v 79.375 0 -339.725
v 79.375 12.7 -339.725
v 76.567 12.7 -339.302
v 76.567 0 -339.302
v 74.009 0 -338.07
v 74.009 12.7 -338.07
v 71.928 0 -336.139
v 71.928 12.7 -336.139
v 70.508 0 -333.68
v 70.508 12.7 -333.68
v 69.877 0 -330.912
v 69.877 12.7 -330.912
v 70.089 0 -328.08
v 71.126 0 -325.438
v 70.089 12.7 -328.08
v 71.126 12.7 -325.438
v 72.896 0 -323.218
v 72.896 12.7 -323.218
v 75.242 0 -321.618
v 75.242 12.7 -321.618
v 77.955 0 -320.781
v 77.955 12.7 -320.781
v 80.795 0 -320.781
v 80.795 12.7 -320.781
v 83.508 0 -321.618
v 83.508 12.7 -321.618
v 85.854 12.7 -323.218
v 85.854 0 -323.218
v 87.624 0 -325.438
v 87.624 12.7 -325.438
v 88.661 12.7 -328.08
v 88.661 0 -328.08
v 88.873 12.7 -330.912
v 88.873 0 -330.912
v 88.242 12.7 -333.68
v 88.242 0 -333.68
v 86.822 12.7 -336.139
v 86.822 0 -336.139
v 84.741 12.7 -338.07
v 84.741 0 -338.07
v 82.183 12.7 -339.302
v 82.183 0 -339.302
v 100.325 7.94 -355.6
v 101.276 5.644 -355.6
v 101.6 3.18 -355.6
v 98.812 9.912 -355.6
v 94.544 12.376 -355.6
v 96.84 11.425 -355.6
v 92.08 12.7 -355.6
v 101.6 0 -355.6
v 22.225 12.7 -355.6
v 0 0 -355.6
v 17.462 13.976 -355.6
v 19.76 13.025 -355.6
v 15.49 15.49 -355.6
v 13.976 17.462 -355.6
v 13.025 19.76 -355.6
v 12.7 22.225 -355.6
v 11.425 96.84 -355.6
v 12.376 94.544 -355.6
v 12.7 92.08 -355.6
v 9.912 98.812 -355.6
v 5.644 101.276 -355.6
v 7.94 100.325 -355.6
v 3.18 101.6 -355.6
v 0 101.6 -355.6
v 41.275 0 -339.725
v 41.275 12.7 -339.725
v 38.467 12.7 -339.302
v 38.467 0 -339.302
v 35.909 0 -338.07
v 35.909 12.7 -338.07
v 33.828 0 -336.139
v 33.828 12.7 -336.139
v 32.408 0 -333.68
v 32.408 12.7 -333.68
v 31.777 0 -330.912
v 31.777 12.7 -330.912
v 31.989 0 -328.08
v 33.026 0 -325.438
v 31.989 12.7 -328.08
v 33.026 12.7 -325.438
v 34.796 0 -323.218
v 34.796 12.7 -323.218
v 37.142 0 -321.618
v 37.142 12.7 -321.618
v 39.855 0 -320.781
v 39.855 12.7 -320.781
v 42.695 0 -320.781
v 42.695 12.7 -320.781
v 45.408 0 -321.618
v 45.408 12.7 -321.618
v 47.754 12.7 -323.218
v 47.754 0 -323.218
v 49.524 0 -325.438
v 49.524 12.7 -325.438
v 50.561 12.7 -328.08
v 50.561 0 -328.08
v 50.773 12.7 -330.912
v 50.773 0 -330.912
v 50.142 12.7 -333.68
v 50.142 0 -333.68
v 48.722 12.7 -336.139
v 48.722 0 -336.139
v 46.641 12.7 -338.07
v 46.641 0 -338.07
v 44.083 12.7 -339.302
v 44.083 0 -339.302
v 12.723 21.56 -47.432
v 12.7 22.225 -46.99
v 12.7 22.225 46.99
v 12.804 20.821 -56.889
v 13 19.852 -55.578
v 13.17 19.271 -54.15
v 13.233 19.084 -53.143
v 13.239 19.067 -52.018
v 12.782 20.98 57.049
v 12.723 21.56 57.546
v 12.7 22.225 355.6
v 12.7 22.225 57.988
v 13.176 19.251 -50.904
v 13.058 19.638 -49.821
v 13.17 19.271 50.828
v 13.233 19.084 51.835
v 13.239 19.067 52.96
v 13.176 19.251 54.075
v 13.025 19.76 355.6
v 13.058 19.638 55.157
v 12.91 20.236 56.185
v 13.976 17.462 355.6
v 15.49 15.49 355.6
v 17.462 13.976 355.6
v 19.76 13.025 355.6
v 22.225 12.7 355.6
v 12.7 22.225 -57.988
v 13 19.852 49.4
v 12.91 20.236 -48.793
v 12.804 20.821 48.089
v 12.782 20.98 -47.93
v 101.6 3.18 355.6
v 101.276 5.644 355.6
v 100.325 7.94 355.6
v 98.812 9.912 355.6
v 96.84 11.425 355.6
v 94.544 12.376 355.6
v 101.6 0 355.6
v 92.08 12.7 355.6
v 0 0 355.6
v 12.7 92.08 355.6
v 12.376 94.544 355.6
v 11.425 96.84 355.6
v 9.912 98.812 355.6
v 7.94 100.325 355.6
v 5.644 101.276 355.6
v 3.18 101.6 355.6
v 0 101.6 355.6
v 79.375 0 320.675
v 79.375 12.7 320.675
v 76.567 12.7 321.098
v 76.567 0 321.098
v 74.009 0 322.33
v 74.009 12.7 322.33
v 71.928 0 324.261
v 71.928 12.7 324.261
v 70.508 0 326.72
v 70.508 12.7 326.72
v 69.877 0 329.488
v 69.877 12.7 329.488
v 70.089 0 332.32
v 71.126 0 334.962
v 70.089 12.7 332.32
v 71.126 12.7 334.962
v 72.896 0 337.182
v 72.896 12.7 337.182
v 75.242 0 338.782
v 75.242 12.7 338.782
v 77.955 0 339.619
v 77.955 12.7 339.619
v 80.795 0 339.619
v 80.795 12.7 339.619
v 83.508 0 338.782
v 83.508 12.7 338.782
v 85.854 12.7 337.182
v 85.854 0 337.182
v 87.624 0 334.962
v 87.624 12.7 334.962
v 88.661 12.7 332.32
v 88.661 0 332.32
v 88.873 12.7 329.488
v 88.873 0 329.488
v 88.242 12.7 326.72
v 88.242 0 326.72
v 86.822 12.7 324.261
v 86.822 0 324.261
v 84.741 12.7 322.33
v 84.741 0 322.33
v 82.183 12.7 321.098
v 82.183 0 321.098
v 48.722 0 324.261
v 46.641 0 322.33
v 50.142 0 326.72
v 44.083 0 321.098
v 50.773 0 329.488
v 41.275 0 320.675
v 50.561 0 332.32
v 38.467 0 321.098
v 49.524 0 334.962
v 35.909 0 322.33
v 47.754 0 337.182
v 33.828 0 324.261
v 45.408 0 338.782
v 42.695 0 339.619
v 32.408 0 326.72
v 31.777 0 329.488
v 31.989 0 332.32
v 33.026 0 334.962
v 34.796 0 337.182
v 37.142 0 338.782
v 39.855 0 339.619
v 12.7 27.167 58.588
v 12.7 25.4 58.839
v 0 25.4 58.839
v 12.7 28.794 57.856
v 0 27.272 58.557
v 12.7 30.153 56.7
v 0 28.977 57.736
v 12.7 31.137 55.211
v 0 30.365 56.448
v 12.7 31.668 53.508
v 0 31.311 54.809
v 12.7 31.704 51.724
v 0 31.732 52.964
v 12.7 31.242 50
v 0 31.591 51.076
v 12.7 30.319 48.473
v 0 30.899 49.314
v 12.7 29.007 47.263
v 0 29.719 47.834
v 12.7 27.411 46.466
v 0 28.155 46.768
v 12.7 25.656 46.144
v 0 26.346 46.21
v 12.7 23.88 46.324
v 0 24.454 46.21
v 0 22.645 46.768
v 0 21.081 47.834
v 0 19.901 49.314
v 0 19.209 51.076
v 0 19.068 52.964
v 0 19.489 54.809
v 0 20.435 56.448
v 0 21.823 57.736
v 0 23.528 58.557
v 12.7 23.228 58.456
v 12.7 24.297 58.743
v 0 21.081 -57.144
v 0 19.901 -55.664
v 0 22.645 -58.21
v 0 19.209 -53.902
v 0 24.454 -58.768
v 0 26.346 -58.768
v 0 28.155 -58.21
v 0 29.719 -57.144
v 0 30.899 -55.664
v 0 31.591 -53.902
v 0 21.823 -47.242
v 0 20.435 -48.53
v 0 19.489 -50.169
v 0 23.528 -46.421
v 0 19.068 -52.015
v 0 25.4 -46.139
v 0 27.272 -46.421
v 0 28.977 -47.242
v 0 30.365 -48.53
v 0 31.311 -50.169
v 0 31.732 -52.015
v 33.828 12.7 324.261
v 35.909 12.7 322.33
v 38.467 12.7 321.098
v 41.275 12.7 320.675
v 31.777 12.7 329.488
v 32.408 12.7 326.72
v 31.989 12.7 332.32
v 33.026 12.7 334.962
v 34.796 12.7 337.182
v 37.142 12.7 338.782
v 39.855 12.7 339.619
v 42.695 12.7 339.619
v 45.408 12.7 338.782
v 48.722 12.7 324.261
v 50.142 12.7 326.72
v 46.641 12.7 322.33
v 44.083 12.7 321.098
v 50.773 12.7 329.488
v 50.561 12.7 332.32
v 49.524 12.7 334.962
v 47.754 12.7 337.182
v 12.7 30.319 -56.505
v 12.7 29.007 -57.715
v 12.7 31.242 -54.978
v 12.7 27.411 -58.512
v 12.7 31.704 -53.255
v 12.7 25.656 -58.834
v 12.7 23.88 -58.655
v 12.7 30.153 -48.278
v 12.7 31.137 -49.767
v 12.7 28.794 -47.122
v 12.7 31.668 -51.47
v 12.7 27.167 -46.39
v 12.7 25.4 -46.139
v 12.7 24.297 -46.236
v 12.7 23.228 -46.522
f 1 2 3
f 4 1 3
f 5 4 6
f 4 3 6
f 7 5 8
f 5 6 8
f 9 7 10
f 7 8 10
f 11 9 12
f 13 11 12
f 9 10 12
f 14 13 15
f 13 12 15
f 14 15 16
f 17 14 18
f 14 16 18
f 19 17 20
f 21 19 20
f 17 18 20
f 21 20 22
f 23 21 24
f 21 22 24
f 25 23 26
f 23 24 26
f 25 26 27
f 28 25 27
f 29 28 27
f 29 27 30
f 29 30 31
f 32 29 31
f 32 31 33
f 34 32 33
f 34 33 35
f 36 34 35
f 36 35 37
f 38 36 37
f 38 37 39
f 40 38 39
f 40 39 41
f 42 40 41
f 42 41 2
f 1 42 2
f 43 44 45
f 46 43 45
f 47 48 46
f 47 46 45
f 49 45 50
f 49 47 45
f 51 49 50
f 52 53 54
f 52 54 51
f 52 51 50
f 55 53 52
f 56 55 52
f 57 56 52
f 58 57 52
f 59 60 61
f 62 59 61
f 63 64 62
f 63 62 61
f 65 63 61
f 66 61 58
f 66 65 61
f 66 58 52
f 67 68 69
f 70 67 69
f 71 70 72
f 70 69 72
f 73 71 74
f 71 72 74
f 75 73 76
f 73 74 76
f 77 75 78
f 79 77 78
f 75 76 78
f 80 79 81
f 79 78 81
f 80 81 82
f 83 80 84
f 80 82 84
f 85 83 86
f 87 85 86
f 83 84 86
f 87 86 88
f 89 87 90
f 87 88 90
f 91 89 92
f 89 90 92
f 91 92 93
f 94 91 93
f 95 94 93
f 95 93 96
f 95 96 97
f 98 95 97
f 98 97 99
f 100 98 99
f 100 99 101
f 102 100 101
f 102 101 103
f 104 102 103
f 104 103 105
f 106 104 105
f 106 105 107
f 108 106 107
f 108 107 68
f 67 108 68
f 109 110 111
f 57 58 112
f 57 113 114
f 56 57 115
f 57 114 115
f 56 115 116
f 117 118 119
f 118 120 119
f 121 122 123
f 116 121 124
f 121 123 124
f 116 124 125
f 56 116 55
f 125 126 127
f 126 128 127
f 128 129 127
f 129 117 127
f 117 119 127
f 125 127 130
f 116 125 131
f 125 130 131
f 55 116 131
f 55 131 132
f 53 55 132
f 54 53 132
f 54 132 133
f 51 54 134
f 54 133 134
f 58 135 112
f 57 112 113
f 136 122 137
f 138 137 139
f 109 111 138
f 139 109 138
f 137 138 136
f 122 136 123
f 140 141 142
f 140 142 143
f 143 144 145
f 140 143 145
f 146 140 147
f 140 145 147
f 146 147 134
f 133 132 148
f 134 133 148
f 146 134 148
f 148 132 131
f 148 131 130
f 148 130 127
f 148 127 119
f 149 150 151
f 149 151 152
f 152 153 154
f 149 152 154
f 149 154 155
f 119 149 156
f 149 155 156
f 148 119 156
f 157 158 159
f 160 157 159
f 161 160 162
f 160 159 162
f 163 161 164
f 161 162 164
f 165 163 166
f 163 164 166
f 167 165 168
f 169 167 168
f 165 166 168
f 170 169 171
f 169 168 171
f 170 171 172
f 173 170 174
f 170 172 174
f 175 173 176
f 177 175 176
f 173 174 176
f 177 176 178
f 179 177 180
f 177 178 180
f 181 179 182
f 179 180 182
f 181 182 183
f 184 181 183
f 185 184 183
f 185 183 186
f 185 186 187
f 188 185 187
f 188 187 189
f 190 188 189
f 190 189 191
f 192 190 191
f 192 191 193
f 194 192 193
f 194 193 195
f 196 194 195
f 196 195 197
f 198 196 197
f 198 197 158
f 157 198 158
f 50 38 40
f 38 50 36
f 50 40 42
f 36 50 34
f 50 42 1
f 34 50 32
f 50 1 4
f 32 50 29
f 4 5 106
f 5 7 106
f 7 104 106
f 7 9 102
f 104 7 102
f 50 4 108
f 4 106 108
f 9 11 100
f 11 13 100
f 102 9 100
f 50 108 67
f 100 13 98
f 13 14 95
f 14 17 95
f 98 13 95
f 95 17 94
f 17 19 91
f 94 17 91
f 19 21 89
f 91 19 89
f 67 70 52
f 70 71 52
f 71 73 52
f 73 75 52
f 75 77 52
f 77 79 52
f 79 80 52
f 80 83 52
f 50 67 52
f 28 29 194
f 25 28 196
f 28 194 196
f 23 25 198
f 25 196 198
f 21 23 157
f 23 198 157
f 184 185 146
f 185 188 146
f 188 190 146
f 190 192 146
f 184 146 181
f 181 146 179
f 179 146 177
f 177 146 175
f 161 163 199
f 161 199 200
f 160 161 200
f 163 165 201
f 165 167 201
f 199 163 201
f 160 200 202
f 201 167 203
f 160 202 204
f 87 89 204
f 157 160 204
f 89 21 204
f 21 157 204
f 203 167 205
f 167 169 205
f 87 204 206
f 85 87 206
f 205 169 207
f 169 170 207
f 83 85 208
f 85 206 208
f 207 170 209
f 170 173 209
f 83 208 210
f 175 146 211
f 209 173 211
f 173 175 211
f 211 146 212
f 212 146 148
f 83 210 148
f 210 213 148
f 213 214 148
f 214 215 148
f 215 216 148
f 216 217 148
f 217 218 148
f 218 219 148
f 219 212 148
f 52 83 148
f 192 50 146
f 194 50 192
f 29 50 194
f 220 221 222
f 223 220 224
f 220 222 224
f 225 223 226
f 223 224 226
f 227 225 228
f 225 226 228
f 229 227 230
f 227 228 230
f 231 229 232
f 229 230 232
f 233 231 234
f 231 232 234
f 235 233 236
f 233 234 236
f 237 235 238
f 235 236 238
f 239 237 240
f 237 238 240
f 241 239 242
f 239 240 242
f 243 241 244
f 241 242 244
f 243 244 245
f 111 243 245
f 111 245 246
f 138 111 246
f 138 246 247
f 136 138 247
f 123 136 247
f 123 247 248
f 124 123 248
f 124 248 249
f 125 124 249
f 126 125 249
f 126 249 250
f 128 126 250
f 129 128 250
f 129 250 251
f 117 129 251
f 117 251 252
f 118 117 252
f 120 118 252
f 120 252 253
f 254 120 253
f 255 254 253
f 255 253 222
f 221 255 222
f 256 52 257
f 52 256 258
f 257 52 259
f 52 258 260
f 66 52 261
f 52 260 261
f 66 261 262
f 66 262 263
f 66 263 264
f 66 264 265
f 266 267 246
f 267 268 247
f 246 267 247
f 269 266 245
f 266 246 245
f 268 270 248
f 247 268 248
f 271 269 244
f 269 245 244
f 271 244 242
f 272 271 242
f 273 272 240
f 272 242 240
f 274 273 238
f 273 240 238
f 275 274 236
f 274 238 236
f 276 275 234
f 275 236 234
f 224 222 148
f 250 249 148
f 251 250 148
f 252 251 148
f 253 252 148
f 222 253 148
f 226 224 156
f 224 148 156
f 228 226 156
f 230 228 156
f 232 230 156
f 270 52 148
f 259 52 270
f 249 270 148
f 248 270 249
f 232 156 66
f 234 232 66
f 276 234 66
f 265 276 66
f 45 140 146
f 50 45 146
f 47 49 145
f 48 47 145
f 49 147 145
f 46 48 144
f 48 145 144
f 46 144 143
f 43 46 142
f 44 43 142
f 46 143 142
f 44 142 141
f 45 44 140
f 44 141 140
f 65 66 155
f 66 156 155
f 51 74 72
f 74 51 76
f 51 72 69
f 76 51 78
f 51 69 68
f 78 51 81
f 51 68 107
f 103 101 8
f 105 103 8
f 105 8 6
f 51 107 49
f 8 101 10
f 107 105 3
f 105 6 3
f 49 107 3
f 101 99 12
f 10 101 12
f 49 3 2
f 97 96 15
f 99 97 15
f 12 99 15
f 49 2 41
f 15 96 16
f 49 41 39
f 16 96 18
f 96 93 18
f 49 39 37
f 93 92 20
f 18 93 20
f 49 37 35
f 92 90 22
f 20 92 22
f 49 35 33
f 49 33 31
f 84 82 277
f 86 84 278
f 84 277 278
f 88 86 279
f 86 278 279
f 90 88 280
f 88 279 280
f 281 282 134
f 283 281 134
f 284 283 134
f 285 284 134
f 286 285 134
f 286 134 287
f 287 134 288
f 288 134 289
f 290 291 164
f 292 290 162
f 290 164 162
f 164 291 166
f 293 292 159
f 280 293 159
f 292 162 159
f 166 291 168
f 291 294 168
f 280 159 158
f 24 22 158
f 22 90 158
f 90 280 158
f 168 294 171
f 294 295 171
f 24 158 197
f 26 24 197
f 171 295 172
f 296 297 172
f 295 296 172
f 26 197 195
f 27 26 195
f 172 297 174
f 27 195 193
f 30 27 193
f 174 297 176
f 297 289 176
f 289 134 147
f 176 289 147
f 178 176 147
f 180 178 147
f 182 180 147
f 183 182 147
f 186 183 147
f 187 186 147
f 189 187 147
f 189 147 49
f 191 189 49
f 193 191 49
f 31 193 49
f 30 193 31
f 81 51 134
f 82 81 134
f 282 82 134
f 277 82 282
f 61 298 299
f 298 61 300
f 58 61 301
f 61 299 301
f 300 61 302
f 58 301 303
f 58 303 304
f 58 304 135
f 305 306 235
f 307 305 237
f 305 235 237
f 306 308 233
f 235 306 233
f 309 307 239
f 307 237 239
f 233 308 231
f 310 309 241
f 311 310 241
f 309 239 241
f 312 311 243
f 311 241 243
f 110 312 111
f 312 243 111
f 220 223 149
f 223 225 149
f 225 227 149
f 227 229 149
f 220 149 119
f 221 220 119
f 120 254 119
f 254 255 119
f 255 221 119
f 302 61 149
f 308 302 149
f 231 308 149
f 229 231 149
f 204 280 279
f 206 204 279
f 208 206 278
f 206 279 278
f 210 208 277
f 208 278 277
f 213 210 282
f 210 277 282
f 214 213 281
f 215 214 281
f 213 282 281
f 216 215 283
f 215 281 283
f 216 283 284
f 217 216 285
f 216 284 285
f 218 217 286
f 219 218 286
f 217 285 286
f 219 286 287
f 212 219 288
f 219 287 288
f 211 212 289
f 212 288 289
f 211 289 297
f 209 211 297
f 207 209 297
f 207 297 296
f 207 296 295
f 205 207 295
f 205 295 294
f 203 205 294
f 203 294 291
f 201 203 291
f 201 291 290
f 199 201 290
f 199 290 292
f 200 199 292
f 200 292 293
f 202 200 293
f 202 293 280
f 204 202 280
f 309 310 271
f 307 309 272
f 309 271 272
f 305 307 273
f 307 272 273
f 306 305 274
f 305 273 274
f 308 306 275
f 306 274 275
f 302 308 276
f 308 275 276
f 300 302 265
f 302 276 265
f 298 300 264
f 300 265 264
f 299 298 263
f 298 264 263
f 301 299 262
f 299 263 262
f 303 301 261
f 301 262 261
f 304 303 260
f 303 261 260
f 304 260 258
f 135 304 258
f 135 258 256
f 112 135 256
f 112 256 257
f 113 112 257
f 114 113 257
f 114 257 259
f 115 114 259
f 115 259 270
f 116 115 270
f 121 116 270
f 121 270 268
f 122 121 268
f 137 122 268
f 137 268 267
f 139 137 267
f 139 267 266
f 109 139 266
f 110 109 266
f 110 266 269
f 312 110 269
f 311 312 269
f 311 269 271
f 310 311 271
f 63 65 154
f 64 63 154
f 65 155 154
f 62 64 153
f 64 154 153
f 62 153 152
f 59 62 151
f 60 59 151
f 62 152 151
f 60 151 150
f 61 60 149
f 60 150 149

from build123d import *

# Parameters (mm, degrees)
BOSS_EXTRUDE1_DEPTH = 355.6
CUT_EXTRUDE1_REACH  = 14.7
SKETCH3_R           = 9.525
CUT_EXTRUDE2_REACH  = 103.6
SKETCH4_R           = 6.35


with BuildPart() as part:
    # Sketch1 → Boss-Extrude1 (new body, symmetric)
    with BuildSketch(Plane.XY):
        with BuildLine():
            Line((0, 0), (0, 101.6))
            Line((0, 101.6), (3.18008, 101.6))
            ThreePointArc((3.18008, 101.6), (9.911679988, 98.811679988), (12.7, 92.08008))
            Line((12.7, 92.08008), (12.7, 22.225))
            ThreePointArc((12.7, 22.225), (15.489807909, 15.489807909), (22.225, 12.7))
            Line((22.225, 12.7), (92.08008, 12.7))
            ThreePointArc((92.08008, 12.7), (98.811679988, 9.911679988), (101.6, 3.18008))
            Line((101.6, 3.18008), (101.6, 0))
            Line((101.6, 0), (0, 0))
        make_face()
    extrude(amount=BOSS_EXTRUDE1_DEPTH, both=True)

    # Sketch3 → Cut-Extrude1 (cut, up to next)
    with BuildSketch(Plane(origin=(25.4, 12.7, 0), x_dir=(0, 0, -1), z_dir=(0, 1, 0)), mode=Mode.PRIVATE) as cut_extrude1_sk1:
        with Locations((330.2, -15.875)):
            Circle(SKETCH3_R)
    cut_extrude1_tool1 = extrude(cut_extrude1_sk1.sketch, amount=-CUT_EXTRUDE1_REACH, mode=Mode.PRIVATE) & part.part
    add(cut_extrude1_tool1.solids().sort_by_distance((41.275, 12.7, -330.2))[0], mode=Mode.SUBTRACT)
    # Sketch3 → Cut-Extrude1 (cut, up to next)
    with BuildSketch(Plane(origin=(25.4, 12.7, 0), x_dir=(0, 0, -1), z_dir=(0, 1, 0)), mode=Mode.PRIVATE) as cut_extrude1_sk2:
        with Locations((-330.2, -15.875)):
            Circle(SKETCH3_R)
    cut_extrude1_tool2 = extrude(cut_extrude1_sk2.sketch, amount=-CUT_EXTRUDE1_REACH, mode=Mode.PRIVATE) & part.part
    add(cut_extrude1_tool2.solids().sort_by_distance((41.275, 12.7, 330.2))[0], mode=Mode.SUBTRACT)
    # Sketch3 → Cut-Extrude1 (cut, up to next)
    with BuildSketch(Plane(origin=(25.4, 12.7, 0), x_dir=(0, 0, -1), z_dir=(0, 1, 0)), mode=Mode.PRIVATE) as cut_extrude1_sk3:
        with Locations((-330.2, -53.975)):
            Circle(SKETCH3_R)
    cut_extrude1_tool3 = extrude(cut_extrude1_sk3.sketch, amount=-CUT_EXTRUDE1_REACH, mode=Mode.PRIVATE) & part.part
    add(cut_extrude1_tool3.solids().sort_by_distance((79.375, 12.7, 330.2))[0], mode=Mode.SUBTRACT)
    # Sketch3 → Cut-Extrude1 (cut, up to next)
    with BuildSketch(Plane(origin=(25.4, 12.7, 0), x_dir=(0, 0, -1), z_dir=(0, 1, 0)), mode=Mode.PRIVATE) as cut_extrude1_sk4:
        with Locations((330.2, -53.975)):
            Circle(SKETCH3_R)
    cut_extrude1_tool4 = extrude(cut_extrude1_sk4.sketch, amount=-CUT_EXTRUDE1_REACH, mode=Mode.PRIVATE) & part.part
    add(cut_extrude1_tool4.solids().sort_by_distance((79.375, 12.7, -330.2))[0], mode=Mode.SUBTRACT)

    # Sketch4 → Cut-Extrude2 (cut, up to next)
    with BuildSketch(Plane.ZY, mode=Mode.PRIVATE) as cut_extrude2_sk1:
        with Locations((-52.4891, 25.4)):
            Circle(SKETCH4_R)
    cut_extrude2_tool1 = extrude(cut_extrude2_sk1.sketch, amount=-CUT_EXTRUDE2_REACH, mode=Mode.PRIVATE) & part.part
    add(cut_extrude2_tool1.solids().sort_by_distance((0, 25.4, -52.4891))[0], mode=Mode.SUBTRACT)
    # Sketch4 → Cut-Extrude2 (cut, up to next)
    with BuildSketch(Plane.ZY, mode=Mode.PRIVATE) as cut_extrude2_sk2:
        with Locations((52.4891, 25.4)):
            Circle(SKETCH4_R)
    cut_extrude2_tool2 = extrude(cut_extrude2_sk2.sketch, amount=-CUT_EXTRUDE2_REACH, mode=Mode.PRIVATE) & part.part
    add(cut_extrude2_tool2.solids().sort_by_distance((0, 25.4, 52.4891))[0], mode=Mode.SUBTRACT)


solid = part.part
